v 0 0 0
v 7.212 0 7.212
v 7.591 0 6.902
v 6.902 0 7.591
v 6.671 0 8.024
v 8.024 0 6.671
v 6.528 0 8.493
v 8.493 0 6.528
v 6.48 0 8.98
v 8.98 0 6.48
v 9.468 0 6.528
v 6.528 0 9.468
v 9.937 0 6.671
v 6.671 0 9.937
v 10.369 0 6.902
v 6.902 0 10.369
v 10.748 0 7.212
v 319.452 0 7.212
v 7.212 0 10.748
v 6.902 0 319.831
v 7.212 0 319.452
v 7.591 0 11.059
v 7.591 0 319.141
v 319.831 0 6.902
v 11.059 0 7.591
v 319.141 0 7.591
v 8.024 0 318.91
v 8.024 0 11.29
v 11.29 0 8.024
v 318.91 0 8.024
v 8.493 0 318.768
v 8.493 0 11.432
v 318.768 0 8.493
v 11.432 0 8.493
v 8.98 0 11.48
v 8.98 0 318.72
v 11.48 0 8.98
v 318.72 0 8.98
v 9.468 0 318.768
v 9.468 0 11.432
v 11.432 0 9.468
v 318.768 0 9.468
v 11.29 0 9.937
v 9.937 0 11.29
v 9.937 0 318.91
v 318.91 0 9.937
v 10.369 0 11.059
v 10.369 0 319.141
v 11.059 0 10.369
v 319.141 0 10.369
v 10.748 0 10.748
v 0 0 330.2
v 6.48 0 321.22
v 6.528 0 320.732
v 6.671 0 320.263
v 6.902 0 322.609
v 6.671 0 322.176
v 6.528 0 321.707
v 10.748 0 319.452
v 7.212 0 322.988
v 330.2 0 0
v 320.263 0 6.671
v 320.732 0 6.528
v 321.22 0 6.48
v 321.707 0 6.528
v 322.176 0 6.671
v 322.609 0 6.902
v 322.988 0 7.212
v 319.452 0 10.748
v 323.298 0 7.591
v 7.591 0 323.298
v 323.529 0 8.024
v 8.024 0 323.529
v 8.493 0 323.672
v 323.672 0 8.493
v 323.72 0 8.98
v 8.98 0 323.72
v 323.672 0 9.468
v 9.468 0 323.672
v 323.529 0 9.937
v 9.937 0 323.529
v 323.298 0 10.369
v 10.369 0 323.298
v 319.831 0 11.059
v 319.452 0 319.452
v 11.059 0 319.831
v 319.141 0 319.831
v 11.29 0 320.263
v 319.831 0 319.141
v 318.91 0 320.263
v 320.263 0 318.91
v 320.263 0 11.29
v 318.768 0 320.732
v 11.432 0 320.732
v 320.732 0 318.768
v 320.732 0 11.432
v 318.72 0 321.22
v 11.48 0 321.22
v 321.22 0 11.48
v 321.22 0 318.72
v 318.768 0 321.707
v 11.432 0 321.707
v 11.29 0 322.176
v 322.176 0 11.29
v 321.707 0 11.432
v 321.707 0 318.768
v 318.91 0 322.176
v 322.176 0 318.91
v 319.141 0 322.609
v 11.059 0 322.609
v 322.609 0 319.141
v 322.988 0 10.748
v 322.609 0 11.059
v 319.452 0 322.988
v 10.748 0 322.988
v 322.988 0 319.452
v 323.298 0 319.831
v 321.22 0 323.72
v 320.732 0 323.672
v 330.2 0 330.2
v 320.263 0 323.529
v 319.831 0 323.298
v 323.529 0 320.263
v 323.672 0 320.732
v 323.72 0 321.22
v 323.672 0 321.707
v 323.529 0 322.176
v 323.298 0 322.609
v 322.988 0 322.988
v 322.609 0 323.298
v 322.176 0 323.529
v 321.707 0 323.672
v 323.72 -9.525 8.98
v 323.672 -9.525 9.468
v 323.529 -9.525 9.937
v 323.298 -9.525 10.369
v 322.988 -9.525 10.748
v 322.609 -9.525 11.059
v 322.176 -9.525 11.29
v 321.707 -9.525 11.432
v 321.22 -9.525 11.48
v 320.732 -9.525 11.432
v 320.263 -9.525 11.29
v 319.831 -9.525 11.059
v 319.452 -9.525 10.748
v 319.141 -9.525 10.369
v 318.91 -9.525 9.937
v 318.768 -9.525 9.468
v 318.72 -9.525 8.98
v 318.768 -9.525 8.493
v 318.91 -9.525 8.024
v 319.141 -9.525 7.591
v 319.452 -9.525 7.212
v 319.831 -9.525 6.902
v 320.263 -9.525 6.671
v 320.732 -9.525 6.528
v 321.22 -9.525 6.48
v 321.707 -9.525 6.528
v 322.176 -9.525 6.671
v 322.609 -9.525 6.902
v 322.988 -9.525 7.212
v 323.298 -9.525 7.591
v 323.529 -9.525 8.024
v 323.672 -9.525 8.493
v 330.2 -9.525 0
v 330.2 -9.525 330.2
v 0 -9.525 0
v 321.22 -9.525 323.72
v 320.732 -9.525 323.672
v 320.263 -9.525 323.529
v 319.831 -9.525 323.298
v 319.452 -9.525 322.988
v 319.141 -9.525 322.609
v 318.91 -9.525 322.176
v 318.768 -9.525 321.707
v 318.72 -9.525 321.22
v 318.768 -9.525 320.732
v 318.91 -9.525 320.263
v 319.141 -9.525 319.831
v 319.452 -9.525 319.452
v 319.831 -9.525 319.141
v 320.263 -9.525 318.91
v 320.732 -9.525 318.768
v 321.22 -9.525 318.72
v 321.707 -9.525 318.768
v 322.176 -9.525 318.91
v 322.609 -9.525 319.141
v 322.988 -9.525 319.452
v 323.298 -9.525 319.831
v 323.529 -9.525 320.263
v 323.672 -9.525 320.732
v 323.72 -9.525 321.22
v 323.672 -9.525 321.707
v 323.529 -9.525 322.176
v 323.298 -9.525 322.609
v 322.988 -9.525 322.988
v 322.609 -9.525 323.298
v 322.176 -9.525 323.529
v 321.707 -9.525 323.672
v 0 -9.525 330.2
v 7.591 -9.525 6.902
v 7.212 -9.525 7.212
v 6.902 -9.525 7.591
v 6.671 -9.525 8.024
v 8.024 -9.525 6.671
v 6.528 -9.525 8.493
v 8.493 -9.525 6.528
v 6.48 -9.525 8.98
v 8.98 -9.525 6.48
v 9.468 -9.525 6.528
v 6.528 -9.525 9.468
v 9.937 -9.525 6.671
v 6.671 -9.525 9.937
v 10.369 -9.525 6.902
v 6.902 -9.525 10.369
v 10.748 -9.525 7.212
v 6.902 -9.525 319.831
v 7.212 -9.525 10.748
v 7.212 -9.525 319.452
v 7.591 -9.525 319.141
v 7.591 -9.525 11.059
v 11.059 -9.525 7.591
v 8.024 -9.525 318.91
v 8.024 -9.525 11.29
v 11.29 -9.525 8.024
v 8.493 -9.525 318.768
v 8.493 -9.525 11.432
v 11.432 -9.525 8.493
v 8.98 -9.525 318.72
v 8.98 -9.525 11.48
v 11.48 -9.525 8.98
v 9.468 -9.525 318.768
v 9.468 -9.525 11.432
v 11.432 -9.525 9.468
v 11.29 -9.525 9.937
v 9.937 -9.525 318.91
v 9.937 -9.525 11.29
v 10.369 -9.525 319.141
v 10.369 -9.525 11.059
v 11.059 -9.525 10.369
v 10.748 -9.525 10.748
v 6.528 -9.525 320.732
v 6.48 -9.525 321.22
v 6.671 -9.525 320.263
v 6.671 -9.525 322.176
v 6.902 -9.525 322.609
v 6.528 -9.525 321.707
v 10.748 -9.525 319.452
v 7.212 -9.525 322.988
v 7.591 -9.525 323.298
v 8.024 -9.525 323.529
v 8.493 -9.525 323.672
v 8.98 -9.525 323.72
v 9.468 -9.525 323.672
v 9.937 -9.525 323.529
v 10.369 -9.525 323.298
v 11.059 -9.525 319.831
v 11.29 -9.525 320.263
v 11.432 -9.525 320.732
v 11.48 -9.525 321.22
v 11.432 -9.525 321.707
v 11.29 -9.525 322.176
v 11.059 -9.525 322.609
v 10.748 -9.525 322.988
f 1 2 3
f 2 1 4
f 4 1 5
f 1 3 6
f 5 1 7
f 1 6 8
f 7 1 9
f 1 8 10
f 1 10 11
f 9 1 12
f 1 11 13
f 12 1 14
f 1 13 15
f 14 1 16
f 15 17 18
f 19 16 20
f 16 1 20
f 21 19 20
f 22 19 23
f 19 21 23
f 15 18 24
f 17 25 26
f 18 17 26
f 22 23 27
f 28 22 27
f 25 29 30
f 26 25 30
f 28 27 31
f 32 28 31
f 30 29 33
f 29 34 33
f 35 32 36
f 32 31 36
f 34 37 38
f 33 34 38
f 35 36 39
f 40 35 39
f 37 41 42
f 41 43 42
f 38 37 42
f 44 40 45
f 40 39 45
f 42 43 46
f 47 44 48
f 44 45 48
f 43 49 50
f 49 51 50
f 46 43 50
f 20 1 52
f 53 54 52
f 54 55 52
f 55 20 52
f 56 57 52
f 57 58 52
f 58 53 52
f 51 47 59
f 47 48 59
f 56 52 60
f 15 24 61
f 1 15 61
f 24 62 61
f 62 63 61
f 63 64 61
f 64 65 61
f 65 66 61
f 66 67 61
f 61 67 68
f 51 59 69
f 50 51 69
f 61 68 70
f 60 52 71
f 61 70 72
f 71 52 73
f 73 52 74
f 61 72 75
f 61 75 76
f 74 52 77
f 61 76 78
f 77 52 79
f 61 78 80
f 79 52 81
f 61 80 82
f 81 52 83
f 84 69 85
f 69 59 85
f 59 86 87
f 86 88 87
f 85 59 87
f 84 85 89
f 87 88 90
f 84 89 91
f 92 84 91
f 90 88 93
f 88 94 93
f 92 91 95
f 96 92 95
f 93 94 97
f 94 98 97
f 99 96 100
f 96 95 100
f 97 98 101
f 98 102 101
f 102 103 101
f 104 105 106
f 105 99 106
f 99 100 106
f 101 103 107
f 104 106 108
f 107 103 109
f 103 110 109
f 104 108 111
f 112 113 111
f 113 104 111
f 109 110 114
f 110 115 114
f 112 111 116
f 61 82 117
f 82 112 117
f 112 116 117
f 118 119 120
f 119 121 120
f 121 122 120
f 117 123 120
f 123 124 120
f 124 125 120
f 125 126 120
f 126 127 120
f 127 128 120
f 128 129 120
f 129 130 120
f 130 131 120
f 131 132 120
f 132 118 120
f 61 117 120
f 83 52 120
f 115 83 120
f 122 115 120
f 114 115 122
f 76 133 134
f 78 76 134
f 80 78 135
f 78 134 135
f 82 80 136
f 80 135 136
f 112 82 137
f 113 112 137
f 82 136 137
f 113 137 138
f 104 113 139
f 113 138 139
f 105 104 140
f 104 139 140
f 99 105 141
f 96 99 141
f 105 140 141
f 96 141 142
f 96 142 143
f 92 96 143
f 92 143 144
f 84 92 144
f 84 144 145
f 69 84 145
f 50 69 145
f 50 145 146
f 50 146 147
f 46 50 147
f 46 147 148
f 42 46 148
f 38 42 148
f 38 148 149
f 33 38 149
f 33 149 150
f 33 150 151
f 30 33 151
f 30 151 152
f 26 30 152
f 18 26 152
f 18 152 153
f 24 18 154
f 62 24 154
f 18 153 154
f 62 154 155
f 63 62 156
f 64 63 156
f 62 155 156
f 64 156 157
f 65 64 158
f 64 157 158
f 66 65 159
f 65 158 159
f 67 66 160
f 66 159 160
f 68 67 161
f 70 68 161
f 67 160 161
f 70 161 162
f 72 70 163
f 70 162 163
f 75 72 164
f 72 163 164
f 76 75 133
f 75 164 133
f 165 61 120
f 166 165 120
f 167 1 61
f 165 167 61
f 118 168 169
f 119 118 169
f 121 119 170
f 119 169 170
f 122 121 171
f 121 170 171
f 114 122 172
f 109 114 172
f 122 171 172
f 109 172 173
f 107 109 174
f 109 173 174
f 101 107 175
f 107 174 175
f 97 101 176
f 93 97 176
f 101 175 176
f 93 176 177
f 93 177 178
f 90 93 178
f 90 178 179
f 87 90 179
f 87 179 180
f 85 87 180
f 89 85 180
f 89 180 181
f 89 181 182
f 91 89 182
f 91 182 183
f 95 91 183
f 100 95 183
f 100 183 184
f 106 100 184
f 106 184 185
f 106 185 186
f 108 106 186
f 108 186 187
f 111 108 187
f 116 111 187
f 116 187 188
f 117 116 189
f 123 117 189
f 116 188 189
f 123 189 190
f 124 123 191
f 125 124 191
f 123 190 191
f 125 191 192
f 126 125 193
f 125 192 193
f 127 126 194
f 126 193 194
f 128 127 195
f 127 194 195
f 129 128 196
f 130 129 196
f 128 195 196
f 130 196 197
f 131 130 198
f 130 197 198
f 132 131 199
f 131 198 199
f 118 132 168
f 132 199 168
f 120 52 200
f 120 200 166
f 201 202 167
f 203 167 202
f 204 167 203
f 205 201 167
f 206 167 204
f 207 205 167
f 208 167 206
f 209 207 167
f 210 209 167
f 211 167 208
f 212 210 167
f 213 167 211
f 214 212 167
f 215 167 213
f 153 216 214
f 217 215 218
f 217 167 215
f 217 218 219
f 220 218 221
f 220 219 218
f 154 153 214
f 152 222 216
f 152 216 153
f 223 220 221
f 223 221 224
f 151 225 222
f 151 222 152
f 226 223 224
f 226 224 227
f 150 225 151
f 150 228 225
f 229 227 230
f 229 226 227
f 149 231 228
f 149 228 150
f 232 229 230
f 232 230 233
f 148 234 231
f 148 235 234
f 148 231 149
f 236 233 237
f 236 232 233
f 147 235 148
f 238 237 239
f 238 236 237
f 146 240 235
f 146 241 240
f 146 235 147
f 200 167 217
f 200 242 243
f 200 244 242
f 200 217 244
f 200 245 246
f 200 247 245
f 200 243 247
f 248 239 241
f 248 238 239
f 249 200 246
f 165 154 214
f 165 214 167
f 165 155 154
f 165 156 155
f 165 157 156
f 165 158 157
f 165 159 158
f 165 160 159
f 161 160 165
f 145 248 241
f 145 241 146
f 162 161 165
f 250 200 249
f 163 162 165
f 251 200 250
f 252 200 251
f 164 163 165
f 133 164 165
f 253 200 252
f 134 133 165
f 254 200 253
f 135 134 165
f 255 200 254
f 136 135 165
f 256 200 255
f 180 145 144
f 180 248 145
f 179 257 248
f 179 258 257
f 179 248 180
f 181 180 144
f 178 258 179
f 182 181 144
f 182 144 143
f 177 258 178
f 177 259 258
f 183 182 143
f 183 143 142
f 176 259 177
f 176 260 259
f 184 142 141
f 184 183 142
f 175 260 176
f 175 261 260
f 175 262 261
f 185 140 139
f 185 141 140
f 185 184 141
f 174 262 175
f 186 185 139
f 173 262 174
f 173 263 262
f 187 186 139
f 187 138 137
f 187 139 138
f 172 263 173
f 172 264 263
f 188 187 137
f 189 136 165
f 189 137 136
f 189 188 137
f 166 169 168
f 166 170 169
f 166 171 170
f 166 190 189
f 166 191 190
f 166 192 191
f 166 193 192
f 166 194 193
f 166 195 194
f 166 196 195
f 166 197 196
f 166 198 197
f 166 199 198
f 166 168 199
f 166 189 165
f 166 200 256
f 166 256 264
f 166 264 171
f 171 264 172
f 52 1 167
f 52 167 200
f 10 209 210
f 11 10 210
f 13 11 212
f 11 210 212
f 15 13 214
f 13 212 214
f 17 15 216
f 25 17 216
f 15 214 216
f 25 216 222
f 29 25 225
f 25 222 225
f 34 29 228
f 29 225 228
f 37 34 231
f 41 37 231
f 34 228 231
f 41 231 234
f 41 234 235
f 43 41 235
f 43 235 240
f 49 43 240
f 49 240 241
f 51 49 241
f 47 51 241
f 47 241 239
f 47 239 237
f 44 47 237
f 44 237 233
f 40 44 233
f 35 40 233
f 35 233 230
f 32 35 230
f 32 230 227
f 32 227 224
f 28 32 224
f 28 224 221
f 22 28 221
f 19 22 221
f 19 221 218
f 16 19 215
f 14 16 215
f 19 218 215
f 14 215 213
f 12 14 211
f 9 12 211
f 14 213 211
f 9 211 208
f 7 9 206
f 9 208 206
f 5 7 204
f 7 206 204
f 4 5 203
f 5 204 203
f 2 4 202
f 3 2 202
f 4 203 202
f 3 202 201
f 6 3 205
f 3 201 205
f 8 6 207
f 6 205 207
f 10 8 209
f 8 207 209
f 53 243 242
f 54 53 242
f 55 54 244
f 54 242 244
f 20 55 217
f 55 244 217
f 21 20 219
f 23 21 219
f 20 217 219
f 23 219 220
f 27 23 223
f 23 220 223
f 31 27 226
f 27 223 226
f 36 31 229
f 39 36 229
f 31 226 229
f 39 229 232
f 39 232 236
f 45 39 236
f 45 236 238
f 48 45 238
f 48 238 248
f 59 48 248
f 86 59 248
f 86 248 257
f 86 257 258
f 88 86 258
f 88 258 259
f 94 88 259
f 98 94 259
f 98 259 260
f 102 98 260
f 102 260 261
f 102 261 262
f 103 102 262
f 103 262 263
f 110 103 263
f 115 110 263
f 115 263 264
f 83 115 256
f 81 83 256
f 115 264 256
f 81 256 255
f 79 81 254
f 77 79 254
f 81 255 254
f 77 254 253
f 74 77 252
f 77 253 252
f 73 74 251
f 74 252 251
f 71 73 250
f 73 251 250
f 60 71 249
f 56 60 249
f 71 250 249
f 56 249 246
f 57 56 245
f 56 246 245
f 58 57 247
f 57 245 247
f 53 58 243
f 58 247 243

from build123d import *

# Parameters (mm, degrees)
F0_W            = 330.2
F0_H            = 330.2
F1_DEPTH        = 9.525
F3_D            = 5
F3_COPIES_COUNT = 4


# Not quite as in the source:
# - a pattern or mirror of a feature is missing from the dataset's text; its kind, count and spacing are read off the source's solid


with BuildPart() as f1:
    # F0 (on Front) → F1 (new body)
    with BuildSketch(Plane.XZ):
        with Locations((165.1, 165.1)):
            Rectangle(F0_W, F0_H)
    extrude(amount=F1_DEPTH)

    # F3 (through all)
    with Locations(Plane(origin=(0, 0, 0), x_dir=(-1, 0, 0), z_dir=(0, 1, 0))):
        with Locations((-321.2197438789, 8.9802561211)):
            f3 = Hole(F3_D / 2)

    # F3_copies: F3 ×4 about axis
    f3_copies_axis = Axis((165.1, 0, 165.1), (0, 1, 0))
    for i in range(1, F3_COPIES_COUNT):
        add(f3.rotate(f3_copies_axis, i * 360 / F3_COPIES_COUNT), mode=Mode.SUBTRACT)


solid = f1.part
